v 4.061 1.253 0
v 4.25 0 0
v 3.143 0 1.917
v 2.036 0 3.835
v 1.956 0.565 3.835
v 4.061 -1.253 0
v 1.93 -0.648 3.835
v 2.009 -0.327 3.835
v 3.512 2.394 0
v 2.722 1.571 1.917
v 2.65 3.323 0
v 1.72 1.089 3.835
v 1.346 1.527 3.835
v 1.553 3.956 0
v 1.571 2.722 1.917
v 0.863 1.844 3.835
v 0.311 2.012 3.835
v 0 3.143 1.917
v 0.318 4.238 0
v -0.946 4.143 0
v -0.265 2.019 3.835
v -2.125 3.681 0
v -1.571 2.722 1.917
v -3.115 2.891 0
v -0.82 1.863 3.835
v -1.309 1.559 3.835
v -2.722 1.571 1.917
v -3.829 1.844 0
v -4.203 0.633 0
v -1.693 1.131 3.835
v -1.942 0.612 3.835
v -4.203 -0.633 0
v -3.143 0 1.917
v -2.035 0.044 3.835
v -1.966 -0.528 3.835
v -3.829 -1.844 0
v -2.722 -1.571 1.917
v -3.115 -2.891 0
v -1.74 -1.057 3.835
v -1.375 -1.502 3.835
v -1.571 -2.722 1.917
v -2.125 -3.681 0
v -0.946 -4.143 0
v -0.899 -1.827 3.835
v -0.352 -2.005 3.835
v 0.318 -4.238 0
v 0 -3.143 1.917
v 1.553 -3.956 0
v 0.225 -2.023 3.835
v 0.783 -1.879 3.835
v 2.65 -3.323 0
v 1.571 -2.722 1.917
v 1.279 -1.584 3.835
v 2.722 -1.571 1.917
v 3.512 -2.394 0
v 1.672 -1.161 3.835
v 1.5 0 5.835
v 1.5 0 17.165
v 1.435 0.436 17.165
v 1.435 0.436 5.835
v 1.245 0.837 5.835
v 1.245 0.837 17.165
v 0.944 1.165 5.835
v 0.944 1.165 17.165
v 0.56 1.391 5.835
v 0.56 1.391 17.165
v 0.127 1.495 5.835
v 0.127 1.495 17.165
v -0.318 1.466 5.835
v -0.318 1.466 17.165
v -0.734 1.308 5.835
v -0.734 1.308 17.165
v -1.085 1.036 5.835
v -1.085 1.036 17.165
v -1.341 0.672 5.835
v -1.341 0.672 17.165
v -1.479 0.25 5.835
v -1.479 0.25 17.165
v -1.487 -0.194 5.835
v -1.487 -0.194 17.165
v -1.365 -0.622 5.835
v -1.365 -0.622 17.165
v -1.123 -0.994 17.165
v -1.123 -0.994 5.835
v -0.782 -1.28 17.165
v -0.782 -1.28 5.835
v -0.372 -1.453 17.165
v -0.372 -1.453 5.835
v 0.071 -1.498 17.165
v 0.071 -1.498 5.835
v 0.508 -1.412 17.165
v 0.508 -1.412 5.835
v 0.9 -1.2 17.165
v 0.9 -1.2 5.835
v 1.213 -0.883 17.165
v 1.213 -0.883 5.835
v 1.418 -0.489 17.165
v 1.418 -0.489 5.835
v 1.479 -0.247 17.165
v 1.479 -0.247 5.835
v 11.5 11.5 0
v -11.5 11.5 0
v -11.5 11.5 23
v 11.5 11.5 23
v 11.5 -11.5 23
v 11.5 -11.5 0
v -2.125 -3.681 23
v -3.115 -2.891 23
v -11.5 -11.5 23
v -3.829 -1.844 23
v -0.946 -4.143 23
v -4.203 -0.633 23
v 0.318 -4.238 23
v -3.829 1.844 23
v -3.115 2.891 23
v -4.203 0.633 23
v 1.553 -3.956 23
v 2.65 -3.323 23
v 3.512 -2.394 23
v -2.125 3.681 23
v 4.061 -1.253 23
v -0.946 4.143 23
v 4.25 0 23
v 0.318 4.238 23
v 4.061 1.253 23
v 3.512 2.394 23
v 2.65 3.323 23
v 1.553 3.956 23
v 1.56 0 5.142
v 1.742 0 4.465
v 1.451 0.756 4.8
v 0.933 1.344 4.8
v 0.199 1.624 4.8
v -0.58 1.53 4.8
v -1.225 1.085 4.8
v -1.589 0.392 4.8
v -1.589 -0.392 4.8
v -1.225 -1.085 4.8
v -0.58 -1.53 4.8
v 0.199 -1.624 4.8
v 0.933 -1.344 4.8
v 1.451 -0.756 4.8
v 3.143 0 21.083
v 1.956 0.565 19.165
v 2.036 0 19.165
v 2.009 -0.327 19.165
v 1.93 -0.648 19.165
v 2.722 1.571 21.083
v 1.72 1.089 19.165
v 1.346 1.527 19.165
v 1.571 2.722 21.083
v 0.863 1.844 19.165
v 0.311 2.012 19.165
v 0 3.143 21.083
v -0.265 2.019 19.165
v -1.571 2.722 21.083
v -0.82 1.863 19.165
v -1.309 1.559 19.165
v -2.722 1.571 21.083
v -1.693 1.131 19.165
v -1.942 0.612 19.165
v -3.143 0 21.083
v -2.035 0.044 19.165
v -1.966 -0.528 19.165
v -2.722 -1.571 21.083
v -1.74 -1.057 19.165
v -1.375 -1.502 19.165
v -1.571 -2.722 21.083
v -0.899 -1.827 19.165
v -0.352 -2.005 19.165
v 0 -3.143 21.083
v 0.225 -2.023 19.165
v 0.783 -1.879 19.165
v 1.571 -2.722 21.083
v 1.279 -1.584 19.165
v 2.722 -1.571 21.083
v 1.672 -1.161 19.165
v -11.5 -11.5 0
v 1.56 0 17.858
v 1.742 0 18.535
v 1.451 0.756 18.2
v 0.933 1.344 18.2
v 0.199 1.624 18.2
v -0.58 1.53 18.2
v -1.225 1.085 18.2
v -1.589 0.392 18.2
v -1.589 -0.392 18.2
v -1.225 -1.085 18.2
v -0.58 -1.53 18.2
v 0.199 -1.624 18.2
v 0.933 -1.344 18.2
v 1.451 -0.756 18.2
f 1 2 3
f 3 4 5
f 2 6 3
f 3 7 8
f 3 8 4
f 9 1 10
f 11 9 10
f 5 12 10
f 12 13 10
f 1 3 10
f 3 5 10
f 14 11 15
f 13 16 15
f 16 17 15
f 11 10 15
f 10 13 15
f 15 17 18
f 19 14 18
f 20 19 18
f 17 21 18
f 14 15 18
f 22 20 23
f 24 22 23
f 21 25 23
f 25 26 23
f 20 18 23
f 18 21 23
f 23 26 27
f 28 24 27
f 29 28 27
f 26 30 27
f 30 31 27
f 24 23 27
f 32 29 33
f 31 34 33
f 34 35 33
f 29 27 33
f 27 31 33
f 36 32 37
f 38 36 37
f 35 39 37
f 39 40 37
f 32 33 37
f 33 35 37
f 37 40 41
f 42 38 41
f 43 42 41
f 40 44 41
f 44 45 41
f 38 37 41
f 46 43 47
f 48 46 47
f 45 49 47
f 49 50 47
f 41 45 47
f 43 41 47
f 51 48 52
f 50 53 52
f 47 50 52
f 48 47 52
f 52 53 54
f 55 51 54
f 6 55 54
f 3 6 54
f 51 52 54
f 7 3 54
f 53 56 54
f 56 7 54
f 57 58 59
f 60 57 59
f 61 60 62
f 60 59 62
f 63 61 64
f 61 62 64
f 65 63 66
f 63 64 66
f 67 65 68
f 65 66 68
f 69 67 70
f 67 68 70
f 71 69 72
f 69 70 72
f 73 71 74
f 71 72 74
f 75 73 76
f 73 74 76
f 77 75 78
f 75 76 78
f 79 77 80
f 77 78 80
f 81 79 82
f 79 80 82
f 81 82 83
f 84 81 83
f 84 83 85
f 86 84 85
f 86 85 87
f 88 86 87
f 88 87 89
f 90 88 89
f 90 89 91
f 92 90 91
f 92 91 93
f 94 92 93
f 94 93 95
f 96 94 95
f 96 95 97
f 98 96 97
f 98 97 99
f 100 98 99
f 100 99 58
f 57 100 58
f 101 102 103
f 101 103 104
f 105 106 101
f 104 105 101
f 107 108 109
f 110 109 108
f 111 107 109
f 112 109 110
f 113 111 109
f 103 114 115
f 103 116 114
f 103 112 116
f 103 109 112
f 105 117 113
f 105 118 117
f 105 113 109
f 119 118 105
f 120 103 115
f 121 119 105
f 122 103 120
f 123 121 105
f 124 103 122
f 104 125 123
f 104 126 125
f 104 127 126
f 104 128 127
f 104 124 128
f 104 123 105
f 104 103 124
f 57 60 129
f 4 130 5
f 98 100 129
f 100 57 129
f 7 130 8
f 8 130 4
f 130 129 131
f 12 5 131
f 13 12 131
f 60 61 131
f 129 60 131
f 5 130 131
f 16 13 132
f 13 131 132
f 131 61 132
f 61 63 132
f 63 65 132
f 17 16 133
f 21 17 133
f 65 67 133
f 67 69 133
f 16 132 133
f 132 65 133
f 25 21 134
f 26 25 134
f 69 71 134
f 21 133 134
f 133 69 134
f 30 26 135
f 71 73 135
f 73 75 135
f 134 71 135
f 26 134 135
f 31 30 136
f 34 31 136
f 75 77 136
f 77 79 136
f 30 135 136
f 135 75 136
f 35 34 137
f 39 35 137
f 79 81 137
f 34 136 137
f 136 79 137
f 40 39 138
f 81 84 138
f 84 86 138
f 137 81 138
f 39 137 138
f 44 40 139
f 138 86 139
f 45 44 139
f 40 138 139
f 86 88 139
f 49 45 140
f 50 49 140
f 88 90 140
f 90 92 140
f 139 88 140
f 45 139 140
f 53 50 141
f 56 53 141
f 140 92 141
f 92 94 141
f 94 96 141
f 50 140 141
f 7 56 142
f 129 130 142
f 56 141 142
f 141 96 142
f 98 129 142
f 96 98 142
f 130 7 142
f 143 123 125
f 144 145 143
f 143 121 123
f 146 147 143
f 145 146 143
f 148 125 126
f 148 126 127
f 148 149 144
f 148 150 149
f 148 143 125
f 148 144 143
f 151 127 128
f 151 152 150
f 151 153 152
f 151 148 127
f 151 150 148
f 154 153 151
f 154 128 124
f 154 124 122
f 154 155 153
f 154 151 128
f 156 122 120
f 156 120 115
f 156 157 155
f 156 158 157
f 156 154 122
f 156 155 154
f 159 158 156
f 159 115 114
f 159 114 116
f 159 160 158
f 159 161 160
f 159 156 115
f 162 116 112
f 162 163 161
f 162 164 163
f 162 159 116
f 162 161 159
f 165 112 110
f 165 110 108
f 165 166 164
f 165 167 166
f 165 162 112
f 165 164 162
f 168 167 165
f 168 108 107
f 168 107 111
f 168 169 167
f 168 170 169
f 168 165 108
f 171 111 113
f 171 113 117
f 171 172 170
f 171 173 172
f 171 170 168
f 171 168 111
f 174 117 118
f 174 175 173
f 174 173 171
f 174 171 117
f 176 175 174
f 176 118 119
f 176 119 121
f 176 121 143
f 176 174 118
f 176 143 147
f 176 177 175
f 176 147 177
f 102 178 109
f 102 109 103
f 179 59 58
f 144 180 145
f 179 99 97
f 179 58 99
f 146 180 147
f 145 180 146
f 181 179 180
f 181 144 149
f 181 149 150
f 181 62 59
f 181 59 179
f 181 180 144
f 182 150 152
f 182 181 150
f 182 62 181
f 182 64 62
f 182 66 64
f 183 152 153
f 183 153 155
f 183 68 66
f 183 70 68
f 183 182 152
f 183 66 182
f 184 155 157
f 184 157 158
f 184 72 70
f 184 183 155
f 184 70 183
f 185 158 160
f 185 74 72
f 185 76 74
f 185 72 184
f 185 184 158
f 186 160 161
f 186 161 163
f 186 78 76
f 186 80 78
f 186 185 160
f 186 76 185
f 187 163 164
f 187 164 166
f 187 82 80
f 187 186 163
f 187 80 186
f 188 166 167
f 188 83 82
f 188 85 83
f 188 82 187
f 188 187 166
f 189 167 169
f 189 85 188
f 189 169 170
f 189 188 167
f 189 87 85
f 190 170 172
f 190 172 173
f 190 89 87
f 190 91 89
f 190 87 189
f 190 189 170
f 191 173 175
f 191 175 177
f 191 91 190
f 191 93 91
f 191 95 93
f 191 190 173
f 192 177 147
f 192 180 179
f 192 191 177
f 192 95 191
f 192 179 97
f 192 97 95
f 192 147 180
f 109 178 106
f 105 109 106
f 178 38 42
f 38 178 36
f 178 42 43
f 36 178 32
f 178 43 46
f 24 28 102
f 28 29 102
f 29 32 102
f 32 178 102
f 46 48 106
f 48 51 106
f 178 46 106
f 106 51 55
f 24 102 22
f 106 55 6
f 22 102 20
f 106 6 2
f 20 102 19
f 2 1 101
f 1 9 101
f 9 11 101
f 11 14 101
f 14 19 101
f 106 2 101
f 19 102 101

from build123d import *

# Parameters (mm, degrees)
SKETCH_W        = 23
SKETCH_H        = 23
PAD_DEPTH       = 23
SKETCH001_R     = 1.5
POCKET_DEPTH    = 23.001
CHAMFER_1_ANGLE = 60
CHAMFER_1_SIZE  = 2.75
CHAMFER_2_ANGLE = 60
CHAMFER_2_SIZE  = 2.75
FILLET_R        = 4


with BuildPart() as part:
    # Sketch → Pad (new body)
    with BuildSketch(Plane.XY):
        Rectangle(SKETCH_W, SKETCH_H)
    extrude(amount=PAD_DEPTH)

    # Sketch001 (on Face6 of Pad) → Pocket (cut, through all)
    with BuildSketch(Plane.XY.offset(23)):
        Circle(SKETCH001_R)
    extrude(amount=-POCKET_DEPTH, mode=Mode.SUBTRACT)

    # Chamfer 1
    chamfer_1_edges = [part.edges().sort_by_distance(p)[0] for p in [
        (-1.5, 0, 23),
    ]]
    chamfer_1_side = part.faces().sort_by_distance((-11.174731, 0, 23))[0]
    chamfer(chamfer_1_edges, length=CHAMFER_1_SIZE, angle=CHAMFER_1_ANGLE, reference=chamfer_1_side)

    # Chamfer 2
    chamfer_2_edges = [part.edges().sort_by_distance(p)[0] for p in [
        (-1.5, 0, 0),
    ]]
    chamfer_2_side = part.faces().sort_by_distance((-11.174731, 0, 0))[0]
    chamfer(chamfer_2_edges, length=CHAMFER_2_SIZE, angle=CHAMFER_2_ANGLE, reference=chamfer_2_side)

    # Fillet
    fillet_edges = [part.edges().sort_by_distance(p)[0] for p in [
        (-1.5, 0, 4.76314),
        (-1.5, 0, 18.23686),
    ]]
    fillet(fillet_edges, radius=FILLET_R)


solid = part.part
